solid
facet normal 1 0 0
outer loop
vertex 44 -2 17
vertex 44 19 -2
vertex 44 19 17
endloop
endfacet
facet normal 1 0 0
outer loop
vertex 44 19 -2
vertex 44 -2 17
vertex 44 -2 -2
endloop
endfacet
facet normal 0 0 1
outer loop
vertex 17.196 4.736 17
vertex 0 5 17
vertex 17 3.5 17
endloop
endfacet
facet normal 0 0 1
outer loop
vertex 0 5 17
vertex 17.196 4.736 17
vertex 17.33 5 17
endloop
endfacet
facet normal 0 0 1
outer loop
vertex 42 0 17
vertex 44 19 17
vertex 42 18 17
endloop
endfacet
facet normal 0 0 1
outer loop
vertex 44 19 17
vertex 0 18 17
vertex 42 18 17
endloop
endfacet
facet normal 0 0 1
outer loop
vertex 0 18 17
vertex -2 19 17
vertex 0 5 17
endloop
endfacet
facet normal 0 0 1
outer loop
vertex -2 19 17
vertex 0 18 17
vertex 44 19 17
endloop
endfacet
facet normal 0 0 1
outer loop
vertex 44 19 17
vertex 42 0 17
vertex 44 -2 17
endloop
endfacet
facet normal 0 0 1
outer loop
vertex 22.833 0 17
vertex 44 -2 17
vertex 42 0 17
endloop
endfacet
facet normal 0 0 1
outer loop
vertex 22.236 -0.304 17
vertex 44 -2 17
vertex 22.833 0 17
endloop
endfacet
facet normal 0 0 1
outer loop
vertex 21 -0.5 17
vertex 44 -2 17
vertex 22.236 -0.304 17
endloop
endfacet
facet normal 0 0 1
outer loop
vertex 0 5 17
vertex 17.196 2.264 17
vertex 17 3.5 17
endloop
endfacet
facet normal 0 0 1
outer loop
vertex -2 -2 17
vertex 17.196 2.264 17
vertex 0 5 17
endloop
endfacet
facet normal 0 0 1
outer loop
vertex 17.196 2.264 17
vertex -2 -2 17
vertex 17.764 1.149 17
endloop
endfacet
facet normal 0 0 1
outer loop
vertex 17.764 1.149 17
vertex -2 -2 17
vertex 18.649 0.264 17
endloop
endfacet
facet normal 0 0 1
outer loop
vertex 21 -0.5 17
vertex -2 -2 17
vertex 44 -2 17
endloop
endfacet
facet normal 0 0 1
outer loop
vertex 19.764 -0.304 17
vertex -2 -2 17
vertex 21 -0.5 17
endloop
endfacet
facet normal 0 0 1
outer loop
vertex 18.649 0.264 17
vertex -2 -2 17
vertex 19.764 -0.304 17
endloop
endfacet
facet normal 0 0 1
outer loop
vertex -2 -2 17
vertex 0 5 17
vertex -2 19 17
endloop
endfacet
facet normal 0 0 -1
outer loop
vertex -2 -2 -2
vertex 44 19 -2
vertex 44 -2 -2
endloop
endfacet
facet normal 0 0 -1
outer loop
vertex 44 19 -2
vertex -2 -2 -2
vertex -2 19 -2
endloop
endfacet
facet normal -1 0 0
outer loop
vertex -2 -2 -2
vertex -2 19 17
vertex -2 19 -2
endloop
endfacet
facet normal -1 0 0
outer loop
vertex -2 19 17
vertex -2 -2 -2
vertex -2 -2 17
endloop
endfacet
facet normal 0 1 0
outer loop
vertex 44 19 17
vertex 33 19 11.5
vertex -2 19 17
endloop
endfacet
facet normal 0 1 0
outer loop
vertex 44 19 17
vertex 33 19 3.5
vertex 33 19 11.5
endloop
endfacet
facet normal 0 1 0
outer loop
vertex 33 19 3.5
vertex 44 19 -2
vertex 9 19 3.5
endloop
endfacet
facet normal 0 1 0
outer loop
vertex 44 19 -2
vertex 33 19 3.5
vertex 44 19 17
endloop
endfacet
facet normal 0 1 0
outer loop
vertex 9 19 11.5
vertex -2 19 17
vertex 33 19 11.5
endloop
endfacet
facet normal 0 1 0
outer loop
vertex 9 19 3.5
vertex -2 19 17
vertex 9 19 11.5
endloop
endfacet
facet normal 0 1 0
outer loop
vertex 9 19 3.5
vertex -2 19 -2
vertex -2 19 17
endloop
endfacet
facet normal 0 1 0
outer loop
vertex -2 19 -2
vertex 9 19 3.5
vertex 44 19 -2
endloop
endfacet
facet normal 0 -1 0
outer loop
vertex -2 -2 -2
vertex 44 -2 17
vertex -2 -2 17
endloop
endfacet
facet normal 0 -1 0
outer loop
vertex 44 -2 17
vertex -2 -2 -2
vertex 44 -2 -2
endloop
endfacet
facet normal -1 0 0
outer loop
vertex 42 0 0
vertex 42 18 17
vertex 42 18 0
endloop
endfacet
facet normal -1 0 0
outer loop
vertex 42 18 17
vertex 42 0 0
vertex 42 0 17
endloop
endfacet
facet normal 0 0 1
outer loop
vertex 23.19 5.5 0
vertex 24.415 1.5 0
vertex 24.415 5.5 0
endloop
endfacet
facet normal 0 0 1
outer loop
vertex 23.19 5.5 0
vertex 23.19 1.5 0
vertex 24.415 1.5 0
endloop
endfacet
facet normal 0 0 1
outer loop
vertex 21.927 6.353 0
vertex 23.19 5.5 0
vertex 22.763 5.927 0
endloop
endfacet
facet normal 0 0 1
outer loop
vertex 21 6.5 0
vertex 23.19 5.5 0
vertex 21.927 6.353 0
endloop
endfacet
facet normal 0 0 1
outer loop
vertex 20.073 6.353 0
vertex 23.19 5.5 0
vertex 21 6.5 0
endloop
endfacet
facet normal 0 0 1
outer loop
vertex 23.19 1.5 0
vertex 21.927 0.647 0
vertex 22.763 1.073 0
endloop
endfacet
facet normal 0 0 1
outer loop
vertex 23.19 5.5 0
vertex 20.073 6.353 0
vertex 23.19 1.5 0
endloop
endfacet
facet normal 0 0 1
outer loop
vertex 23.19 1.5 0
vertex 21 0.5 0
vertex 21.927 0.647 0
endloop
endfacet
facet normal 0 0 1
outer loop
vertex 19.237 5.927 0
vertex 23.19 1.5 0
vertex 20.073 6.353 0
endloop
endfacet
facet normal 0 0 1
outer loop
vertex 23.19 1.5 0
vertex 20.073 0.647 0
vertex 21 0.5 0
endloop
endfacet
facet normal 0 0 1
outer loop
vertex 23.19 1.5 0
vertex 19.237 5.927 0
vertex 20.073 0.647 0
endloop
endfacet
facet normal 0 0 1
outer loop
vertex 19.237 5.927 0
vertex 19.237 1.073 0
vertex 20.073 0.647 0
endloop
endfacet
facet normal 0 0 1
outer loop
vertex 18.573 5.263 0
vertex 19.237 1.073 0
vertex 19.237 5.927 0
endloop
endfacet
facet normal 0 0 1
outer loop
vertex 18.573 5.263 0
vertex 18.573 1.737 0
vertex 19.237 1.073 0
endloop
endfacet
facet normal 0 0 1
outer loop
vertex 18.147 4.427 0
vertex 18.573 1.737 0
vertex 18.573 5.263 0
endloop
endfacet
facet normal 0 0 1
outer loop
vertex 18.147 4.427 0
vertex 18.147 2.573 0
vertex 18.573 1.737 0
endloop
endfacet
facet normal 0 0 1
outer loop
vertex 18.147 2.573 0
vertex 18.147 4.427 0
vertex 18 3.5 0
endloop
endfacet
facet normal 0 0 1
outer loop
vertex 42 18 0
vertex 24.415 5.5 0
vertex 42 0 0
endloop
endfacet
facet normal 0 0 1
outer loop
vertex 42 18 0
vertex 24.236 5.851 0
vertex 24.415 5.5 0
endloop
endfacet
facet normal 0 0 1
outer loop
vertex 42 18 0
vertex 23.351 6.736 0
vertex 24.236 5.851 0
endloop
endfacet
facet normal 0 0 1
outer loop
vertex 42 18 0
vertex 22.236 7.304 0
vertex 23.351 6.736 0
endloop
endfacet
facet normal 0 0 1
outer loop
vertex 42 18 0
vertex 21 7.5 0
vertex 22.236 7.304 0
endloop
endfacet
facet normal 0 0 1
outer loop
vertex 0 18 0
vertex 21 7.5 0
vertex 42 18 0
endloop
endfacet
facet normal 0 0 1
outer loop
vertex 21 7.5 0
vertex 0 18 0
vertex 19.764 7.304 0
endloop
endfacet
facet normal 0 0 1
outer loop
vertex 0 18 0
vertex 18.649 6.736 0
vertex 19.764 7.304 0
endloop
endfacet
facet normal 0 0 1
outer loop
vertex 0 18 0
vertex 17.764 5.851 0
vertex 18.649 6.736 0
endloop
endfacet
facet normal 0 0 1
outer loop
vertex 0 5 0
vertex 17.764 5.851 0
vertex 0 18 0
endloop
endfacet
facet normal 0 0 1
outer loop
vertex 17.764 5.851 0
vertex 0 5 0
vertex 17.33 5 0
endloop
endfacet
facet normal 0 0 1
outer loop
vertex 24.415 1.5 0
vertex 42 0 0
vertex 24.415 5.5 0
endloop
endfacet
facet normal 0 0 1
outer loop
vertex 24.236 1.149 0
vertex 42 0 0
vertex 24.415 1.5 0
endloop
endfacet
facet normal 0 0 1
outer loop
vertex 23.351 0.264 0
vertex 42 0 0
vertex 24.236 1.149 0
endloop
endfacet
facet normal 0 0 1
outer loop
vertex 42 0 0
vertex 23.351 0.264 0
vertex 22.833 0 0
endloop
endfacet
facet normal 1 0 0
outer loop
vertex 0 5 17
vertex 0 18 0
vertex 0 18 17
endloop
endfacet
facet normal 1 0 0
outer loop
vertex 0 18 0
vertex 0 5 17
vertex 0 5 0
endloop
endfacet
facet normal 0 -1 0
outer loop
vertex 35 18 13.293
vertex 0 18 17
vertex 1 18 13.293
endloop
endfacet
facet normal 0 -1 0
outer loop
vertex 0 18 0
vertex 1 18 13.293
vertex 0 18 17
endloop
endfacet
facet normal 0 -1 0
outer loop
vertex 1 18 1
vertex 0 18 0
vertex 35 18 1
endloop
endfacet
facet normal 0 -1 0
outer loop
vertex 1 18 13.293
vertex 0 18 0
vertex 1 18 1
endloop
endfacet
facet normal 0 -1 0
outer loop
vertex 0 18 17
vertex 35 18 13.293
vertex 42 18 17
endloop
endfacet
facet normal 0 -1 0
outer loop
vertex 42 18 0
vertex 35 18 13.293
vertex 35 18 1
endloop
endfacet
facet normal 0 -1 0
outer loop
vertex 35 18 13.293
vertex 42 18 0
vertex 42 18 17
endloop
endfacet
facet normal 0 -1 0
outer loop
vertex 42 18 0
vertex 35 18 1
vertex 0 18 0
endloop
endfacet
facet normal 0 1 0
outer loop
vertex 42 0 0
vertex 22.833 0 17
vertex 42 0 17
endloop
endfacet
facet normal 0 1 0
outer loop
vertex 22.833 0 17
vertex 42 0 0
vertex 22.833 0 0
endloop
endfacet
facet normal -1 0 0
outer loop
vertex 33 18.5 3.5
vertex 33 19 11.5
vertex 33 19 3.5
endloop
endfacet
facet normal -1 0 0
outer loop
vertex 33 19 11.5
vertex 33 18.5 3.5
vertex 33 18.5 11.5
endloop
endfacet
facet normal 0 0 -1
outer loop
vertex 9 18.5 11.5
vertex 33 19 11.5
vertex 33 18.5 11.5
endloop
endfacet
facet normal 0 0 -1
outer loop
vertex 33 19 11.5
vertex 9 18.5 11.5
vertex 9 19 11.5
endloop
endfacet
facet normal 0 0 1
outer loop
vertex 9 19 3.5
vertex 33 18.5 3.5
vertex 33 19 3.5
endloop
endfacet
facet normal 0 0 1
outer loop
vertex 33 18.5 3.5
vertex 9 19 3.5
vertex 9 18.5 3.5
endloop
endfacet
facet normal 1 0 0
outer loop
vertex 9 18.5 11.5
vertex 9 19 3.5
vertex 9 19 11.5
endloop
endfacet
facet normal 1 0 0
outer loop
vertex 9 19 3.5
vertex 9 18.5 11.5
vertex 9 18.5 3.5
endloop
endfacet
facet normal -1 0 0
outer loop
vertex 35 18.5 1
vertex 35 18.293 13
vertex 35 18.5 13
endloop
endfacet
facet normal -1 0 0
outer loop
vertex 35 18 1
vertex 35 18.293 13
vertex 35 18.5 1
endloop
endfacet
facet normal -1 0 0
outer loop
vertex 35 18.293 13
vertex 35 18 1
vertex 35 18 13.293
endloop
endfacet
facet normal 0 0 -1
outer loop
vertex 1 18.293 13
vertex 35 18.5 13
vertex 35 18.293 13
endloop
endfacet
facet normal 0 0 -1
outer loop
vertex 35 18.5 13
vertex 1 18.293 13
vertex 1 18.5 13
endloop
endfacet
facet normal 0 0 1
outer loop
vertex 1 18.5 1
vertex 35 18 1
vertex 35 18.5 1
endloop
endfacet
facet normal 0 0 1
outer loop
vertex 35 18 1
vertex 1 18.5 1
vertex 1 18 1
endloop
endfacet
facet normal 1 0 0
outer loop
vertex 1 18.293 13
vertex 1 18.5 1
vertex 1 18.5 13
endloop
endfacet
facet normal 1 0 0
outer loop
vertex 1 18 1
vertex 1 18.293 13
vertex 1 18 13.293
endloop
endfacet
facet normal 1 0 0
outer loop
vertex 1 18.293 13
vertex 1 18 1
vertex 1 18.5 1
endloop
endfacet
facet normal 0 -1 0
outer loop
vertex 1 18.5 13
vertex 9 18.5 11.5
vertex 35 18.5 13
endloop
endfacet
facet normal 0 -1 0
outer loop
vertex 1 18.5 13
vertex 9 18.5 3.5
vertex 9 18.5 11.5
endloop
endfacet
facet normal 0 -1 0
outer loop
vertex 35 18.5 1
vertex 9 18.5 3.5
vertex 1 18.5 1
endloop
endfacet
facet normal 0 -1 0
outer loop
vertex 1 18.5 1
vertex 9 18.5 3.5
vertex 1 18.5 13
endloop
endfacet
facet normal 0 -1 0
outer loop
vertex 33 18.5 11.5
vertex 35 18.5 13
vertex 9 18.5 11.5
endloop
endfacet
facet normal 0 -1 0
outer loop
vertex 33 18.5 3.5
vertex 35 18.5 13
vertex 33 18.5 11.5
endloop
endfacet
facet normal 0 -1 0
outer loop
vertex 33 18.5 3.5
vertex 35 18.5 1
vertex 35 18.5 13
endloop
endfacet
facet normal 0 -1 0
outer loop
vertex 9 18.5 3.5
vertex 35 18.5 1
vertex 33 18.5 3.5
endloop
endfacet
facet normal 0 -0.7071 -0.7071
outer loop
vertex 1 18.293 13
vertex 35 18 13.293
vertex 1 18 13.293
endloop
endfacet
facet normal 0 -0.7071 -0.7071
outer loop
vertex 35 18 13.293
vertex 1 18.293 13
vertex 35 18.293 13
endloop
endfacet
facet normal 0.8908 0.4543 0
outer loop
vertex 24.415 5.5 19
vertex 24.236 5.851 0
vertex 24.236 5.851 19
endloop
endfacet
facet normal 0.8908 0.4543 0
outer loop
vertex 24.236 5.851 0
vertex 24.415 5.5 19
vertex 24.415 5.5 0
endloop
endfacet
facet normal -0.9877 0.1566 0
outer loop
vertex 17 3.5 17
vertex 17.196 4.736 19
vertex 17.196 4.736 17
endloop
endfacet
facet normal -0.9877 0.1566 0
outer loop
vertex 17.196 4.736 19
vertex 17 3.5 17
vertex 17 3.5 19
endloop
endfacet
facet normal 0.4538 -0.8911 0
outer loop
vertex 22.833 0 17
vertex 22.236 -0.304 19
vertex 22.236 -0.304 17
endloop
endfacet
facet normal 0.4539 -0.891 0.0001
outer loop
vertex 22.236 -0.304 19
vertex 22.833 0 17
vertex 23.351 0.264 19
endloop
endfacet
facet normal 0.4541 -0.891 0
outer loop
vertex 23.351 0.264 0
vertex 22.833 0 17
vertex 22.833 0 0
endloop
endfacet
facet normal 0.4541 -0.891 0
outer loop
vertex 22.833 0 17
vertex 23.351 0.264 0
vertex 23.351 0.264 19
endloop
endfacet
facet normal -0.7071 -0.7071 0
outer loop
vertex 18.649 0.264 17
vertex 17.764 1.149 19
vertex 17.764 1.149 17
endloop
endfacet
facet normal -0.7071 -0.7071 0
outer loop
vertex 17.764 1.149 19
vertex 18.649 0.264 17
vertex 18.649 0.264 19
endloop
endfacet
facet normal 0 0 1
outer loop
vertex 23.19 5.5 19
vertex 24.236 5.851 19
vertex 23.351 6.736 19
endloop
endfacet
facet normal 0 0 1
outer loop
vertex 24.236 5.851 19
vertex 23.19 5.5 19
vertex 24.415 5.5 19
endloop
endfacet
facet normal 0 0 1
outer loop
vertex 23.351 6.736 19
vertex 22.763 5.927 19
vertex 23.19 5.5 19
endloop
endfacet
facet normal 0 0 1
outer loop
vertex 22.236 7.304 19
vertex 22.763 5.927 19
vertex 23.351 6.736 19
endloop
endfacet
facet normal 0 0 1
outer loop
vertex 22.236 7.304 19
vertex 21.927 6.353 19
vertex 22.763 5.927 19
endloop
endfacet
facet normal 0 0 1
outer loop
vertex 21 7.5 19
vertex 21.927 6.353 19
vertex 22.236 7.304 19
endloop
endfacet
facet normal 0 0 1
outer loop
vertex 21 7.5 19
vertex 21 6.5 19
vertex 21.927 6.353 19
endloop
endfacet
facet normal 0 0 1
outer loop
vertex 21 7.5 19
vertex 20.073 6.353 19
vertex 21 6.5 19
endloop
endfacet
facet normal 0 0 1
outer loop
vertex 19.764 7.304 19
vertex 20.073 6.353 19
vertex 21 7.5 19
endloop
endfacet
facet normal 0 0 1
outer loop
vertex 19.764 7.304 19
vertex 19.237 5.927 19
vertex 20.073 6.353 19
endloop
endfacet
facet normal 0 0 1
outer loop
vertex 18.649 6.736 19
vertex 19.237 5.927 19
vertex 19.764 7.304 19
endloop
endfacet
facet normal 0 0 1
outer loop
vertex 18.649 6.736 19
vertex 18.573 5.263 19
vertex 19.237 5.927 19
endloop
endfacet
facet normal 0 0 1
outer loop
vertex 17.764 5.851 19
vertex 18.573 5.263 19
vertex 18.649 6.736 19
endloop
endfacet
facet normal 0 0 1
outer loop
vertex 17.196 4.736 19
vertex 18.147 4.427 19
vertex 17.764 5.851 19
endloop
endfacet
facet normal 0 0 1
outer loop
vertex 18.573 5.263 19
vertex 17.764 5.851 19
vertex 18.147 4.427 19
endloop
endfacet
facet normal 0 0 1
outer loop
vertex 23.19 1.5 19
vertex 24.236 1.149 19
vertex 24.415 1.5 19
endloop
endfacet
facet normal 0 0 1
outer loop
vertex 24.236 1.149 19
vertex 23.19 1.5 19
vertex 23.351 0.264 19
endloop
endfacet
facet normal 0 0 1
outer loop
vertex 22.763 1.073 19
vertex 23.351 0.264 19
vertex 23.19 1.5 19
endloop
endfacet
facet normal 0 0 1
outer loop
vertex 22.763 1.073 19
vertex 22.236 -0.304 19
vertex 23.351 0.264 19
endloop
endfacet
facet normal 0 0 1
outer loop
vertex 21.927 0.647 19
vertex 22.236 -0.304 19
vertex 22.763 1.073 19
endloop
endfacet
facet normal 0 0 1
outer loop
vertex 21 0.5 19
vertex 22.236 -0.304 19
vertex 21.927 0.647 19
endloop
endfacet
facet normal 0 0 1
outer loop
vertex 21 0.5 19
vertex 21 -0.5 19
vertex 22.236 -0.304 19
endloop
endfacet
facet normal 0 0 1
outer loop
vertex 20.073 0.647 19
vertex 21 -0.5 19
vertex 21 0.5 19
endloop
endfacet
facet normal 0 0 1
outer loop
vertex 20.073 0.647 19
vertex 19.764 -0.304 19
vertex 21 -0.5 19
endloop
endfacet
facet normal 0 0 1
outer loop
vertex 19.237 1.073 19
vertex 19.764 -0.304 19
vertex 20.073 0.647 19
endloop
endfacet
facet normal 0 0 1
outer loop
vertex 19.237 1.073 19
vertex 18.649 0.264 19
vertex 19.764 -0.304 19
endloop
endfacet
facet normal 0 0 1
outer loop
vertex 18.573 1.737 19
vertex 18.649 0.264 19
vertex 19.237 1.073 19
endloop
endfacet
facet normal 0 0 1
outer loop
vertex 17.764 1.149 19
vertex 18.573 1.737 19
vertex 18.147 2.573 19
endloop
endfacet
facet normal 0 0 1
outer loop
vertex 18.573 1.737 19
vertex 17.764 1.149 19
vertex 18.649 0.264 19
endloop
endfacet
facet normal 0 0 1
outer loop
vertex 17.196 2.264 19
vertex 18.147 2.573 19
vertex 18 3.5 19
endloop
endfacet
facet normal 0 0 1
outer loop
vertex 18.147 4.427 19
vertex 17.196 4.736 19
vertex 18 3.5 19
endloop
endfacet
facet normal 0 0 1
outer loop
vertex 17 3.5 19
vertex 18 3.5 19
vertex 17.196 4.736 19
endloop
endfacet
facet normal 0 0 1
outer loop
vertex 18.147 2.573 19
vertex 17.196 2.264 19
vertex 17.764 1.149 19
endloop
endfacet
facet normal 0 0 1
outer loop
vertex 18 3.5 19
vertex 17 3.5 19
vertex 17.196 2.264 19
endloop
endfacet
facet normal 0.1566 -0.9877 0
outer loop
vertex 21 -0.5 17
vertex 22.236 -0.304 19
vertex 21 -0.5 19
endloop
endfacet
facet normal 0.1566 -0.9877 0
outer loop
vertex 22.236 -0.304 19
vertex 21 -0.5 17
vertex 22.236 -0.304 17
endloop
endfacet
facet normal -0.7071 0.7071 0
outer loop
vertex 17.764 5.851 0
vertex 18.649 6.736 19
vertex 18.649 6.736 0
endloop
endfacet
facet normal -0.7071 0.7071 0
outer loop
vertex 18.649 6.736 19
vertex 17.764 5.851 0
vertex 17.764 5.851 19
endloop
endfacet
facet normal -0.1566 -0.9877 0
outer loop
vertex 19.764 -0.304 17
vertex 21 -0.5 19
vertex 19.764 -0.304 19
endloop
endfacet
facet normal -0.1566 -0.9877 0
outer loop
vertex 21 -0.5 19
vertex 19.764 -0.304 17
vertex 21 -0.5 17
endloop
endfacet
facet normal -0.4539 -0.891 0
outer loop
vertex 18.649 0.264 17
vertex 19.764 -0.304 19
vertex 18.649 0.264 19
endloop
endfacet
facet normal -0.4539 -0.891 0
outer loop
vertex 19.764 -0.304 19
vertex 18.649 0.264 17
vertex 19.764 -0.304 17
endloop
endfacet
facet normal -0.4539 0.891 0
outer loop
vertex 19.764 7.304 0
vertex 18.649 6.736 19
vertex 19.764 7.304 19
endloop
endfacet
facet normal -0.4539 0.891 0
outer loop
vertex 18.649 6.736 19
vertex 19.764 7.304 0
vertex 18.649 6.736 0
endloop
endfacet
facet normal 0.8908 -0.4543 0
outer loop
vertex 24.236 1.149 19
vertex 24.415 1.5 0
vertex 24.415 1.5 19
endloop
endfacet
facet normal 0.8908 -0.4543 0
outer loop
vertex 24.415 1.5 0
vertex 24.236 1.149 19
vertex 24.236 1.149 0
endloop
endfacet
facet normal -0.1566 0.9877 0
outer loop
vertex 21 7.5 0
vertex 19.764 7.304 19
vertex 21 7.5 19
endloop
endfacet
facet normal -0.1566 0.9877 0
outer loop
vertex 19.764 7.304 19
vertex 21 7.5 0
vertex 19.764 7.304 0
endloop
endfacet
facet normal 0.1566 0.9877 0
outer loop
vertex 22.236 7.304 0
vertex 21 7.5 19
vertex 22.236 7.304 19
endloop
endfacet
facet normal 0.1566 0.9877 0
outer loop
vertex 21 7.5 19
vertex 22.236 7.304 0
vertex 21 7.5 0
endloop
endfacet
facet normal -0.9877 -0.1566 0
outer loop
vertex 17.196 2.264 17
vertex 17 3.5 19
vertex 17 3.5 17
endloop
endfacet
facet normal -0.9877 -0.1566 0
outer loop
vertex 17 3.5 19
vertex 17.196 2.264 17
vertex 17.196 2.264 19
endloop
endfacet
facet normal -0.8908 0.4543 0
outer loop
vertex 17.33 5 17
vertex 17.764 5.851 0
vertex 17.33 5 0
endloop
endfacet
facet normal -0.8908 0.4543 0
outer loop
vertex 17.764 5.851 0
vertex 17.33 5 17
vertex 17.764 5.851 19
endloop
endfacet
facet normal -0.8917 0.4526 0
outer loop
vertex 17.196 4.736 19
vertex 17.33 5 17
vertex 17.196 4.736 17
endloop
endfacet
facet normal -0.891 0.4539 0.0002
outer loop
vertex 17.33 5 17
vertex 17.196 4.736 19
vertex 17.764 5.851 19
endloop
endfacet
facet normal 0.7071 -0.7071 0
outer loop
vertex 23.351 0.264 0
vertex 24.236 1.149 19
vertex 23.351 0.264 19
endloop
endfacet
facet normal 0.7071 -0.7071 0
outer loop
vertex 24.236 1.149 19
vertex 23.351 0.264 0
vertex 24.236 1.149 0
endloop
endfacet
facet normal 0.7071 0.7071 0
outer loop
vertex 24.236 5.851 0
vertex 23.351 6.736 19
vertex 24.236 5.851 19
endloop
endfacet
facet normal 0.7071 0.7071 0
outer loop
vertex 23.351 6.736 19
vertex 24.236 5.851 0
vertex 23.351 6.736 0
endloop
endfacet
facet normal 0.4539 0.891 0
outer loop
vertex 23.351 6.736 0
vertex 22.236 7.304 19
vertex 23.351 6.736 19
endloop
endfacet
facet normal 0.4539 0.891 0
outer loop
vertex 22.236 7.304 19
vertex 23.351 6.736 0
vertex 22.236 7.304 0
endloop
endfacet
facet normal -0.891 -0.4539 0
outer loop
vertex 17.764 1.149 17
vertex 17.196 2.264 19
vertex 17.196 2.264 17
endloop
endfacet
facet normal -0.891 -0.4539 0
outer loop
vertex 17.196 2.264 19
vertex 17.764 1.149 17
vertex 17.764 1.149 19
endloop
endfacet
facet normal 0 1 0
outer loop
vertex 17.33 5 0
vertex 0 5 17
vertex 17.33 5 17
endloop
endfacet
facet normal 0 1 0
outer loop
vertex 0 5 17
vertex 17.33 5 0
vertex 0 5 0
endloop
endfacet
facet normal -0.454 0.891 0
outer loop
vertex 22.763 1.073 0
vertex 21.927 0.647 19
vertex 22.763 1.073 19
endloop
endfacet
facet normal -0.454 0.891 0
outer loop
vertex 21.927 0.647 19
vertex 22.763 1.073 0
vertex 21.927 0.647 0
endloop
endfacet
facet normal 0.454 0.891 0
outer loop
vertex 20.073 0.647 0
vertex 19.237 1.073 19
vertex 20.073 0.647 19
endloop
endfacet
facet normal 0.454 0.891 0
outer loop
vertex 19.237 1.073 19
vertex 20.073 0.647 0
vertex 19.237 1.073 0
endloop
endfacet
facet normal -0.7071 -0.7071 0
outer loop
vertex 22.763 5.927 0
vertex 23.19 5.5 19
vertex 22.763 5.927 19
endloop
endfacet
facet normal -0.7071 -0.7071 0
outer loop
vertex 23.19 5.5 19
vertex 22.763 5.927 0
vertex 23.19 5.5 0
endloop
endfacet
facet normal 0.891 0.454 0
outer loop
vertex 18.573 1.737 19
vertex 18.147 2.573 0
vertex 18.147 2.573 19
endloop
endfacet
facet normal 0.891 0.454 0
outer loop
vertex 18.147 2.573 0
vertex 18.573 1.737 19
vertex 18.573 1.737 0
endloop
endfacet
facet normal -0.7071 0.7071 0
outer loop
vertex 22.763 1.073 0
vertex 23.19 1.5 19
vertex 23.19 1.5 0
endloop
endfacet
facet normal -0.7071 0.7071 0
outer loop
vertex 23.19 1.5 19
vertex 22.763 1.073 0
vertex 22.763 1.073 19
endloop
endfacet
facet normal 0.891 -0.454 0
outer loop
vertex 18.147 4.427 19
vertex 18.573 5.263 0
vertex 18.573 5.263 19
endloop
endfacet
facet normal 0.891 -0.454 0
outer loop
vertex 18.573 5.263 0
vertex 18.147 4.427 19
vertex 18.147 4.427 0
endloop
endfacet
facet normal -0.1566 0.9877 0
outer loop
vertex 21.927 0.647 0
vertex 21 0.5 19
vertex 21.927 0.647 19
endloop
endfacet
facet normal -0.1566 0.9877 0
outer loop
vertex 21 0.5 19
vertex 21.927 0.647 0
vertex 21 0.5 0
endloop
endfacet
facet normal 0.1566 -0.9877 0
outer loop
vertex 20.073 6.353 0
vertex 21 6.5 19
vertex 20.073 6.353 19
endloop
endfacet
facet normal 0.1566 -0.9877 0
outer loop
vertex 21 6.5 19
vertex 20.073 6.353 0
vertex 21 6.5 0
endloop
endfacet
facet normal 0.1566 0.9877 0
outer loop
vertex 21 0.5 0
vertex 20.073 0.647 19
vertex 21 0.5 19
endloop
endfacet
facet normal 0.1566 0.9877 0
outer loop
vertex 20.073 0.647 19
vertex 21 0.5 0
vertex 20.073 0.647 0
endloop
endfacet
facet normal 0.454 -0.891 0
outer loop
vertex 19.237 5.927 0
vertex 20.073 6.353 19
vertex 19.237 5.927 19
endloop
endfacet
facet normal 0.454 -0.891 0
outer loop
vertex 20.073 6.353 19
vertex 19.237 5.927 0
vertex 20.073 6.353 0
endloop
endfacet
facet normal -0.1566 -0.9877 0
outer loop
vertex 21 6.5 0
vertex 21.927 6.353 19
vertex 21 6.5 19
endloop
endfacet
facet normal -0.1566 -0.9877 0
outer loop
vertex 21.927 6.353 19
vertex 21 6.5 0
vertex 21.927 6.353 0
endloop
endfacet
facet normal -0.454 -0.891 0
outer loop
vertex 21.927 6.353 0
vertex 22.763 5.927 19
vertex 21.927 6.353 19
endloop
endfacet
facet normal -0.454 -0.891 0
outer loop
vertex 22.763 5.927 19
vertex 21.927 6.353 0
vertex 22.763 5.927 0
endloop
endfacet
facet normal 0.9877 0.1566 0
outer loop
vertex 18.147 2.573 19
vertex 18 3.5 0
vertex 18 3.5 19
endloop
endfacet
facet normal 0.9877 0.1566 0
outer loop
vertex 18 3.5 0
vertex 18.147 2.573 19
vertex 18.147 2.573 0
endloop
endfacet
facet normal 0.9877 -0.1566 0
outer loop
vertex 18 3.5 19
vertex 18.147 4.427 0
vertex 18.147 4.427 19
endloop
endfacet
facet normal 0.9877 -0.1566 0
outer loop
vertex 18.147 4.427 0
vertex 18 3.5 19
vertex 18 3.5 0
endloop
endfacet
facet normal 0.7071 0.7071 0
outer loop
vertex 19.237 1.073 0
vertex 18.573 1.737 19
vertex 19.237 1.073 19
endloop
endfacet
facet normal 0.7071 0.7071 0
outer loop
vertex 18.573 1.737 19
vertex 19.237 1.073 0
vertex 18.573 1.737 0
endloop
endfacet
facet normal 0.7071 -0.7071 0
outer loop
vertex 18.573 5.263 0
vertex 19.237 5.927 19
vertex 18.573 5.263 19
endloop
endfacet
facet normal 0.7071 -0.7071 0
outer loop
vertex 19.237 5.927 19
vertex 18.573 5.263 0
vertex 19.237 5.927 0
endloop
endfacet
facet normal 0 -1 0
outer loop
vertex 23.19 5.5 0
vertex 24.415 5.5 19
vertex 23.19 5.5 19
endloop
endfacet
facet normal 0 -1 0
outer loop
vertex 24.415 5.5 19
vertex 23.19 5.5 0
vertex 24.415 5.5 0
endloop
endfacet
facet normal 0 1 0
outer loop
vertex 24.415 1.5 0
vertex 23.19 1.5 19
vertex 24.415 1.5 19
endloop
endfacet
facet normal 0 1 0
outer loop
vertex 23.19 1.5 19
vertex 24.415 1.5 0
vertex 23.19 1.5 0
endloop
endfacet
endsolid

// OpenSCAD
T=2;
screen_w = 34;
screen_h = 12;
screen_d = 18;
screen_vis_h = 8;
screen_vis_w = 24;
screen_vis_offset_top = 1.5;
screen_vis_offset_left = 2;

outer_w = 46;
outer_h = 19;


x_middle = (outer_w-2*T)/2;
z_middle = (outer_h-T)/2;
echo(x_middle);
echo(z_middle);


difference() {
    union() {
        translate([-T,-T,-T]) cube([outer_w, screen_d+T+1, outer_h]);
    }
    cube([outer_w-2*T, screen_d, 100]);
//    #translate([
//        screen_w-screen_vis_w-screen_vis_offset_left, 
//        screen_d-1, 
//        screen_h-screen_vis_h-screen_vis_offset_top
//    ]) cube([screen_vis_w, 4, screen_vis_h]);
    
    translate([
        x_middle,
        screen_d+1,
        z_middle-1
    ]) cube([screen_vis_w, 4, screen_vis_h], center=true);

    translate([
        x_middle - (screen_w - screen_vis_w)/2 + screen_vis_offset_left,
        screen_d,
        z_middle-1 - (screen_h - screen_vis_h)/2 + screen_vis_offset_top
    ]) cube([screen_w, 1, screen_h], center=true);

    #translate([
        x_middle - (screen_w - screen_vis_w)/2 + screen_vis_offset_left,
        screen_d - (sqrt(2)-1),
        z_middle-1 - (-screen_vis_h)/2 + screen_vis_offset_top
    ]) rotate([45,0,0]) cube([screen_w, 1, 1], center=true);
}

difference() {
    union() {
        translate([x_middle,3.5,0]) cylinder(z_middle*2+T,4,4, $fn=20);
        cube([x_middle,5,z_middle*2]);
    }
    translate([x_middle,3.5,0]) cylinder(21,3,3, $fn=20);
    translate([x_middle+3,3.5,0]) cube([4,4,100], center=true);
}
